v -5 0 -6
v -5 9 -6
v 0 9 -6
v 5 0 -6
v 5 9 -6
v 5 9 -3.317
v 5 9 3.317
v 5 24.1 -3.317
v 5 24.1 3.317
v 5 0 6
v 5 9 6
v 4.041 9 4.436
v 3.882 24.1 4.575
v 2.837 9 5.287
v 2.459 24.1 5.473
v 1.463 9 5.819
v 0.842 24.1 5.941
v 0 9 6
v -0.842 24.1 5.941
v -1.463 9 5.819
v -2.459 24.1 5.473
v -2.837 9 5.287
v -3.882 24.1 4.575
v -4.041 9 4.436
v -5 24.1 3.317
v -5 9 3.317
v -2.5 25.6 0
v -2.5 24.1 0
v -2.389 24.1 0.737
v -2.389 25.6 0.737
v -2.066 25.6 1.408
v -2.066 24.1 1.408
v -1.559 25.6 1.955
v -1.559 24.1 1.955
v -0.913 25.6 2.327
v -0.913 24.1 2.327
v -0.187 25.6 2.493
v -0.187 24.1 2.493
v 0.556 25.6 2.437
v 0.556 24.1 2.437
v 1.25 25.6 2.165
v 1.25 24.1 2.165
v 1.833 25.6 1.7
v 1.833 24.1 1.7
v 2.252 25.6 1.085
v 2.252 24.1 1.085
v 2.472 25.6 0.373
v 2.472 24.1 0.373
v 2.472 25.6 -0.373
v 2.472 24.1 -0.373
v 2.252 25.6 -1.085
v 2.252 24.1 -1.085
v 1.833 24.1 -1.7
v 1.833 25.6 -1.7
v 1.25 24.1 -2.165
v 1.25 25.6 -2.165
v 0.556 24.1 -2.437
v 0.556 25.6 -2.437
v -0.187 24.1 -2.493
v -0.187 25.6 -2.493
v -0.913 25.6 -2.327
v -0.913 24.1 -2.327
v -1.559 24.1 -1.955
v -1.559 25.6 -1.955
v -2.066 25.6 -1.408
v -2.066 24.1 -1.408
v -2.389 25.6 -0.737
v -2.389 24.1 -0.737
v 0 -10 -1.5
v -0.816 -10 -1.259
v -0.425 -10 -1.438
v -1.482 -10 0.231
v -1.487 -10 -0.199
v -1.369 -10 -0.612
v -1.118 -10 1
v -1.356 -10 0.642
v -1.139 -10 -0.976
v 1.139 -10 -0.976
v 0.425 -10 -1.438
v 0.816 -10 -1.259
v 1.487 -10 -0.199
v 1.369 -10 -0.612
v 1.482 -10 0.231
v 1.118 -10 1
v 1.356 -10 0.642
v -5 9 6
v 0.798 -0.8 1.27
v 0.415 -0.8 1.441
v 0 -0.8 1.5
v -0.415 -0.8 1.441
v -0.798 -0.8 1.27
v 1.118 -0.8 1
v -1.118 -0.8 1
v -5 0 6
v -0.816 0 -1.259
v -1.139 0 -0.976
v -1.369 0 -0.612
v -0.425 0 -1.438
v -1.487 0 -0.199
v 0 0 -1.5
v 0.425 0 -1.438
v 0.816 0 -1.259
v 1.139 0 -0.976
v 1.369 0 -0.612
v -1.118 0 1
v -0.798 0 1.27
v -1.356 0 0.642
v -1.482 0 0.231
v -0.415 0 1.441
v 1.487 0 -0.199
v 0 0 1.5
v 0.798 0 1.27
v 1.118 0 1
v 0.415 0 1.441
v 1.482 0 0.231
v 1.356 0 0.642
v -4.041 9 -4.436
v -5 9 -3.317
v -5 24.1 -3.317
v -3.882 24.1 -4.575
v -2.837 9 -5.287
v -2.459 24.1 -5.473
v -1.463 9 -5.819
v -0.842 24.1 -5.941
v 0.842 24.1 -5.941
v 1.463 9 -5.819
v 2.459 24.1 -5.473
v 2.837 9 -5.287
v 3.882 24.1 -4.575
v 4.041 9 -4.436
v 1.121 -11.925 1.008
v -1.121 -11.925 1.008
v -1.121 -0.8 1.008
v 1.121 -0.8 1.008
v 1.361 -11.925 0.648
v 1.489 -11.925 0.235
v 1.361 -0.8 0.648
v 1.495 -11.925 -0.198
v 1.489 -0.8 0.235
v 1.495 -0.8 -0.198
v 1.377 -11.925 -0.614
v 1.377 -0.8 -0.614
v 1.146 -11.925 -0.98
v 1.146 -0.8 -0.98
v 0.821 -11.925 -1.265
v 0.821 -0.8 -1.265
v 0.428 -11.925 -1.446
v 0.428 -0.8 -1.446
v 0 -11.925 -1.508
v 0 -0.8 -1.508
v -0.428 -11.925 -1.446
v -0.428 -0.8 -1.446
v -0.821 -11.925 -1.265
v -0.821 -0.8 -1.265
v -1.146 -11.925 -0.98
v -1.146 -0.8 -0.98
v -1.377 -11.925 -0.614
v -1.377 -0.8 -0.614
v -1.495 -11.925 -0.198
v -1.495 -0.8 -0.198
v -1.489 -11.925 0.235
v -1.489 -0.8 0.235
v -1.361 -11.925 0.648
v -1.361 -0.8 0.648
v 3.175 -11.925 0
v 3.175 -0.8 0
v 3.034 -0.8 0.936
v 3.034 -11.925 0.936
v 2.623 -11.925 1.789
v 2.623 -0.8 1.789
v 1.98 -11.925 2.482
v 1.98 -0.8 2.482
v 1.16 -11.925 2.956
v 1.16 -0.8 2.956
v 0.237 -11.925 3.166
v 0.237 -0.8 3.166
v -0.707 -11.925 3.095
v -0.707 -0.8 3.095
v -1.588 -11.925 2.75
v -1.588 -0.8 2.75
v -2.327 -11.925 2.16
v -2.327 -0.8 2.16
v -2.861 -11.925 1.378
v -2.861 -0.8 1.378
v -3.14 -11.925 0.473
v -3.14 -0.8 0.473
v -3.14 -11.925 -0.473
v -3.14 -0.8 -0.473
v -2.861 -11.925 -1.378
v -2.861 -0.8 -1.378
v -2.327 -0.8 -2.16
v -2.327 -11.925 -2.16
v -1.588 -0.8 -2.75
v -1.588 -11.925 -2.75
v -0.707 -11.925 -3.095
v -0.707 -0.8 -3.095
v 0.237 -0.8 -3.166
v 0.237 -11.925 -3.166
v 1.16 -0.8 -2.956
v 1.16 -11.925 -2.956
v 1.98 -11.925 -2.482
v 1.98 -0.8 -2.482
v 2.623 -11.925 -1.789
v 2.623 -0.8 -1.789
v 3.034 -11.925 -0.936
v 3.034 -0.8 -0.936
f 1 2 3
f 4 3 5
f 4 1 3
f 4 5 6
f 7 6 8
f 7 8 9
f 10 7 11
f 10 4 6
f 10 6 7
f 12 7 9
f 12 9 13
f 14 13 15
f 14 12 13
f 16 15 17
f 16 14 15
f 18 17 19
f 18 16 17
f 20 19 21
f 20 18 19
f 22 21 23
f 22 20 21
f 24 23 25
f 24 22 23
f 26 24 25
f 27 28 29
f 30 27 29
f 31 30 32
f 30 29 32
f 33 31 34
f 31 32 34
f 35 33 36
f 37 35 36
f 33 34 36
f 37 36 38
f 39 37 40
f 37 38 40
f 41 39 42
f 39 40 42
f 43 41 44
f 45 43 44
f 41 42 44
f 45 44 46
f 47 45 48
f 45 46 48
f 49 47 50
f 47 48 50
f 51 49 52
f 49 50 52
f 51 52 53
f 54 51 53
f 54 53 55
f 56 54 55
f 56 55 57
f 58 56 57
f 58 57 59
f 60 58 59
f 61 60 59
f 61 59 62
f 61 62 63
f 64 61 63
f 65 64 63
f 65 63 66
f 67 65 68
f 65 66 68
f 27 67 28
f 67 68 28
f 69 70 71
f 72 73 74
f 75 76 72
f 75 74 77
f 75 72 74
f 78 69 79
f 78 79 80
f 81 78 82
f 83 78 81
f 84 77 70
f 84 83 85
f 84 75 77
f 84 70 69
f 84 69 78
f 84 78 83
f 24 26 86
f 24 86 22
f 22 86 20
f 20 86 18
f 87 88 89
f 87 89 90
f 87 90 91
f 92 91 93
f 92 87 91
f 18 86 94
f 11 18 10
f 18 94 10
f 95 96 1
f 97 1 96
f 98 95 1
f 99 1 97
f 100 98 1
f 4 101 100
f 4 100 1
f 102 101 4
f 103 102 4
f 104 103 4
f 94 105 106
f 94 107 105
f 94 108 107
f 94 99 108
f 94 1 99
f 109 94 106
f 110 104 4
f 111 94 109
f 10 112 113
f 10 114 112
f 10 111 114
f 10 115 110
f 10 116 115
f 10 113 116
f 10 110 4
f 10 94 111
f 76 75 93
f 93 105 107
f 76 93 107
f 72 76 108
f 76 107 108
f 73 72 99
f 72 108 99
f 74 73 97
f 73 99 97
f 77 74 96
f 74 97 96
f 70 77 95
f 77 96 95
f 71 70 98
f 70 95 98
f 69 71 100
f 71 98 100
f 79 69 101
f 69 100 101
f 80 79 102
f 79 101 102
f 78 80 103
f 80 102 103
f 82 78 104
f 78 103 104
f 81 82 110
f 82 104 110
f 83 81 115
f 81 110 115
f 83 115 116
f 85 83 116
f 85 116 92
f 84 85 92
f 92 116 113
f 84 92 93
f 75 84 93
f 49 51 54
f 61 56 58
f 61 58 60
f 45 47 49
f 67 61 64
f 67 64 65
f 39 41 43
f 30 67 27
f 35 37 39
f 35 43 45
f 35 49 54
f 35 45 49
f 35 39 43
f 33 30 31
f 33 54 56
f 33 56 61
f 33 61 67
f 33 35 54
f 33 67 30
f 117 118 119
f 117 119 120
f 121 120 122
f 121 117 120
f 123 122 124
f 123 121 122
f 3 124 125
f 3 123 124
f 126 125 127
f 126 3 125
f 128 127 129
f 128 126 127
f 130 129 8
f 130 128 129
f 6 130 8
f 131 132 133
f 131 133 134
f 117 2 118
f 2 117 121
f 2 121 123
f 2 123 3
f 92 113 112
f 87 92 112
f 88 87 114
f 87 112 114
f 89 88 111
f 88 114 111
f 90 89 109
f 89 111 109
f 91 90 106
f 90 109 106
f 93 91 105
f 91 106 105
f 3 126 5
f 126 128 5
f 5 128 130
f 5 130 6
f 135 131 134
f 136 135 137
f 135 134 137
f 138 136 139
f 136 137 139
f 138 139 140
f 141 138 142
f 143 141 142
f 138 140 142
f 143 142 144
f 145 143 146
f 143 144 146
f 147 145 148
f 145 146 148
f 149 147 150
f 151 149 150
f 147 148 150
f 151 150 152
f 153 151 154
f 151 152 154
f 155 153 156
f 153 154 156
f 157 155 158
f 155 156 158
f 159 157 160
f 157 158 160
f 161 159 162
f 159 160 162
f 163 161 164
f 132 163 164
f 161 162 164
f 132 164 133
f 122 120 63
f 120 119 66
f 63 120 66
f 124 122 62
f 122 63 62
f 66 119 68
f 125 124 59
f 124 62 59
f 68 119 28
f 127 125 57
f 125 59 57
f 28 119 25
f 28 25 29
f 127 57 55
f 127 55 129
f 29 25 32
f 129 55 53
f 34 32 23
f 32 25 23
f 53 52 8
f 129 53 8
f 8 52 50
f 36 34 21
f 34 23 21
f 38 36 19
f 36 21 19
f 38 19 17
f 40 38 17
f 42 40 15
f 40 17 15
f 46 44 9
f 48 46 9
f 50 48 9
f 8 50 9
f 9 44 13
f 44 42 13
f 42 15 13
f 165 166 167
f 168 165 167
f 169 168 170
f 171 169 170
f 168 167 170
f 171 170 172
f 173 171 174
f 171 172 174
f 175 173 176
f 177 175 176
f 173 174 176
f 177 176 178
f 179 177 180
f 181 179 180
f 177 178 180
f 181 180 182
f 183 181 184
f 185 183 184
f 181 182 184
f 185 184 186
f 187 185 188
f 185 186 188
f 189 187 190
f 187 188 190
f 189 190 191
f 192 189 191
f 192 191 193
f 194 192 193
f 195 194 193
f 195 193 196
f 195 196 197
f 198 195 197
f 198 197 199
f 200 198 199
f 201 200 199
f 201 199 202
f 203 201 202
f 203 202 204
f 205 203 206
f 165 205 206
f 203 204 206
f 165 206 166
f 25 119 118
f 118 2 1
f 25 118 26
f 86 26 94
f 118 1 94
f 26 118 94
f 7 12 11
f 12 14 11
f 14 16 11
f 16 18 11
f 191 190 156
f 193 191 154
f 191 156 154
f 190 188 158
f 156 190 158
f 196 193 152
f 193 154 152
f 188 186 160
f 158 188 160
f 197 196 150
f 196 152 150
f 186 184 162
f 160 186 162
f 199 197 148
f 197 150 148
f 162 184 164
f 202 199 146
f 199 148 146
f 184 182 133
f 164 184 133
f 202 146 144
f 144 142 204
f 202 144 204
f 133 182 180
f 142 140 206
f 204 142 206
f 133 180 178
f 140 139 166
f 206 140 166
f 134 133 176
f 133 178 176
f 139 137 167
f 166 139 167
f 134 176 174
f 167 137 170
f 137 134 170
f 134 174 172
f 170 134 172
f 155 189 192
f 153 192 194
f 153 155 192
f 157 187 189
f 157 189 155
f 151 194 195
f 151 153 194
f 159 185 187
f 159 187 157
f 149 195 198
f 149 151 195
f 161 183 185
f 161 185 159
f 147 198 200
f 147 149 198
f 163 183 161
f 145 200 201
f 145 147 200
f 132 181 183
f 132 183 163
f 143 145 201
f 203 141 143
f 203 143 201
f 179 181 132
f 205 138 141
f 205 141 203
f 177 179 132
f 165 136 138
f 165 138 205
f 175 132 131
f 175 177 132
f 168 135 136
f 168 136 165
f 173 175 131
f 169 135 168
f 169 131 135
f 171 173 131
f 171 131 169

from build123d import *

# Parameters (mm, degrees)
F1_DEPTH  = 24.1
F2_W      = 10
F2_H      = 12
F3_DEPTH  = 9
F5_DEPTH  = 10
F6_R      = 2.5
F7_DEPTH  = 1.5
F8_R      = 1.5
F9_DEPTH  = 0.8
F10_R     = 3.175
F11_DEPTH = 11.1252


with BuildPart() as f1:
    # F0 (on Front) → F1 (new body)
    with BuildSketch(Plane.XZ):
        with BuildLine():
            Line((5, -3.316625), (5, 3.316625))
            ThreePointArc((5, 3.316625), (0, 6), (-5, 3.316625))
            Line((-5, 3.316625), (-5, -3.316625))
            ThreePointArc((-5, -3.316625), (0, -6), (5, -3.316625))
        make_face()
    extrude(amount=-F1_DEPTH)

    # F2 (on Front) → F3 (join)
    with BuildSketch(Plane.XZ):
        Rectangle(F2_W, F2_H)
    extrude(amount=-F3_DEPTH)

    # F4 (on face) → F5 (join)
    with BuildSketch(Plane.XZ):
        with BuildLine():
            Line((1.118034, 1), (-1.118034, 1))
            ThreePointArc((-1.118034, 1), (0, -1.5), (1.118034, 1))
        make_face()
    extrude(amount=F5_DEPTH)

    # F6 (on face) → F7 (join)
    with BuildSketch(Plane(origin=(0, 24.1, 0), x_dir=(-1, 0, 0), z_dir=(0, 1, 0))):
        Circle(F6_R)
    extrude(amount=F7_DEPTH)

    # F8 (on face) → F9 (join)
    with BuildSketch(Plane.XZ):
        Circle(F8_R)
    extrude(amount=F9_DEPTH)


with BuildPart() as f11:
    # F10 (on face) → F11 (new body)
    with BuildSketch(Plane.XZ.offset(0.8)):
        Circle(F10_R)
        with BuildLine():
            ThreePointArc((1.121437, 1.00762), (0, -1.50762), (-1.121437, 1.00762))
            Line((-1.121437, 1.00762), (1.121437, 1.00762))
        make_face(mode=Mode.SUBTRACT)
    extrude(amount=F11_DEPTH)


solid = Compound([f1.part, f11.part])
